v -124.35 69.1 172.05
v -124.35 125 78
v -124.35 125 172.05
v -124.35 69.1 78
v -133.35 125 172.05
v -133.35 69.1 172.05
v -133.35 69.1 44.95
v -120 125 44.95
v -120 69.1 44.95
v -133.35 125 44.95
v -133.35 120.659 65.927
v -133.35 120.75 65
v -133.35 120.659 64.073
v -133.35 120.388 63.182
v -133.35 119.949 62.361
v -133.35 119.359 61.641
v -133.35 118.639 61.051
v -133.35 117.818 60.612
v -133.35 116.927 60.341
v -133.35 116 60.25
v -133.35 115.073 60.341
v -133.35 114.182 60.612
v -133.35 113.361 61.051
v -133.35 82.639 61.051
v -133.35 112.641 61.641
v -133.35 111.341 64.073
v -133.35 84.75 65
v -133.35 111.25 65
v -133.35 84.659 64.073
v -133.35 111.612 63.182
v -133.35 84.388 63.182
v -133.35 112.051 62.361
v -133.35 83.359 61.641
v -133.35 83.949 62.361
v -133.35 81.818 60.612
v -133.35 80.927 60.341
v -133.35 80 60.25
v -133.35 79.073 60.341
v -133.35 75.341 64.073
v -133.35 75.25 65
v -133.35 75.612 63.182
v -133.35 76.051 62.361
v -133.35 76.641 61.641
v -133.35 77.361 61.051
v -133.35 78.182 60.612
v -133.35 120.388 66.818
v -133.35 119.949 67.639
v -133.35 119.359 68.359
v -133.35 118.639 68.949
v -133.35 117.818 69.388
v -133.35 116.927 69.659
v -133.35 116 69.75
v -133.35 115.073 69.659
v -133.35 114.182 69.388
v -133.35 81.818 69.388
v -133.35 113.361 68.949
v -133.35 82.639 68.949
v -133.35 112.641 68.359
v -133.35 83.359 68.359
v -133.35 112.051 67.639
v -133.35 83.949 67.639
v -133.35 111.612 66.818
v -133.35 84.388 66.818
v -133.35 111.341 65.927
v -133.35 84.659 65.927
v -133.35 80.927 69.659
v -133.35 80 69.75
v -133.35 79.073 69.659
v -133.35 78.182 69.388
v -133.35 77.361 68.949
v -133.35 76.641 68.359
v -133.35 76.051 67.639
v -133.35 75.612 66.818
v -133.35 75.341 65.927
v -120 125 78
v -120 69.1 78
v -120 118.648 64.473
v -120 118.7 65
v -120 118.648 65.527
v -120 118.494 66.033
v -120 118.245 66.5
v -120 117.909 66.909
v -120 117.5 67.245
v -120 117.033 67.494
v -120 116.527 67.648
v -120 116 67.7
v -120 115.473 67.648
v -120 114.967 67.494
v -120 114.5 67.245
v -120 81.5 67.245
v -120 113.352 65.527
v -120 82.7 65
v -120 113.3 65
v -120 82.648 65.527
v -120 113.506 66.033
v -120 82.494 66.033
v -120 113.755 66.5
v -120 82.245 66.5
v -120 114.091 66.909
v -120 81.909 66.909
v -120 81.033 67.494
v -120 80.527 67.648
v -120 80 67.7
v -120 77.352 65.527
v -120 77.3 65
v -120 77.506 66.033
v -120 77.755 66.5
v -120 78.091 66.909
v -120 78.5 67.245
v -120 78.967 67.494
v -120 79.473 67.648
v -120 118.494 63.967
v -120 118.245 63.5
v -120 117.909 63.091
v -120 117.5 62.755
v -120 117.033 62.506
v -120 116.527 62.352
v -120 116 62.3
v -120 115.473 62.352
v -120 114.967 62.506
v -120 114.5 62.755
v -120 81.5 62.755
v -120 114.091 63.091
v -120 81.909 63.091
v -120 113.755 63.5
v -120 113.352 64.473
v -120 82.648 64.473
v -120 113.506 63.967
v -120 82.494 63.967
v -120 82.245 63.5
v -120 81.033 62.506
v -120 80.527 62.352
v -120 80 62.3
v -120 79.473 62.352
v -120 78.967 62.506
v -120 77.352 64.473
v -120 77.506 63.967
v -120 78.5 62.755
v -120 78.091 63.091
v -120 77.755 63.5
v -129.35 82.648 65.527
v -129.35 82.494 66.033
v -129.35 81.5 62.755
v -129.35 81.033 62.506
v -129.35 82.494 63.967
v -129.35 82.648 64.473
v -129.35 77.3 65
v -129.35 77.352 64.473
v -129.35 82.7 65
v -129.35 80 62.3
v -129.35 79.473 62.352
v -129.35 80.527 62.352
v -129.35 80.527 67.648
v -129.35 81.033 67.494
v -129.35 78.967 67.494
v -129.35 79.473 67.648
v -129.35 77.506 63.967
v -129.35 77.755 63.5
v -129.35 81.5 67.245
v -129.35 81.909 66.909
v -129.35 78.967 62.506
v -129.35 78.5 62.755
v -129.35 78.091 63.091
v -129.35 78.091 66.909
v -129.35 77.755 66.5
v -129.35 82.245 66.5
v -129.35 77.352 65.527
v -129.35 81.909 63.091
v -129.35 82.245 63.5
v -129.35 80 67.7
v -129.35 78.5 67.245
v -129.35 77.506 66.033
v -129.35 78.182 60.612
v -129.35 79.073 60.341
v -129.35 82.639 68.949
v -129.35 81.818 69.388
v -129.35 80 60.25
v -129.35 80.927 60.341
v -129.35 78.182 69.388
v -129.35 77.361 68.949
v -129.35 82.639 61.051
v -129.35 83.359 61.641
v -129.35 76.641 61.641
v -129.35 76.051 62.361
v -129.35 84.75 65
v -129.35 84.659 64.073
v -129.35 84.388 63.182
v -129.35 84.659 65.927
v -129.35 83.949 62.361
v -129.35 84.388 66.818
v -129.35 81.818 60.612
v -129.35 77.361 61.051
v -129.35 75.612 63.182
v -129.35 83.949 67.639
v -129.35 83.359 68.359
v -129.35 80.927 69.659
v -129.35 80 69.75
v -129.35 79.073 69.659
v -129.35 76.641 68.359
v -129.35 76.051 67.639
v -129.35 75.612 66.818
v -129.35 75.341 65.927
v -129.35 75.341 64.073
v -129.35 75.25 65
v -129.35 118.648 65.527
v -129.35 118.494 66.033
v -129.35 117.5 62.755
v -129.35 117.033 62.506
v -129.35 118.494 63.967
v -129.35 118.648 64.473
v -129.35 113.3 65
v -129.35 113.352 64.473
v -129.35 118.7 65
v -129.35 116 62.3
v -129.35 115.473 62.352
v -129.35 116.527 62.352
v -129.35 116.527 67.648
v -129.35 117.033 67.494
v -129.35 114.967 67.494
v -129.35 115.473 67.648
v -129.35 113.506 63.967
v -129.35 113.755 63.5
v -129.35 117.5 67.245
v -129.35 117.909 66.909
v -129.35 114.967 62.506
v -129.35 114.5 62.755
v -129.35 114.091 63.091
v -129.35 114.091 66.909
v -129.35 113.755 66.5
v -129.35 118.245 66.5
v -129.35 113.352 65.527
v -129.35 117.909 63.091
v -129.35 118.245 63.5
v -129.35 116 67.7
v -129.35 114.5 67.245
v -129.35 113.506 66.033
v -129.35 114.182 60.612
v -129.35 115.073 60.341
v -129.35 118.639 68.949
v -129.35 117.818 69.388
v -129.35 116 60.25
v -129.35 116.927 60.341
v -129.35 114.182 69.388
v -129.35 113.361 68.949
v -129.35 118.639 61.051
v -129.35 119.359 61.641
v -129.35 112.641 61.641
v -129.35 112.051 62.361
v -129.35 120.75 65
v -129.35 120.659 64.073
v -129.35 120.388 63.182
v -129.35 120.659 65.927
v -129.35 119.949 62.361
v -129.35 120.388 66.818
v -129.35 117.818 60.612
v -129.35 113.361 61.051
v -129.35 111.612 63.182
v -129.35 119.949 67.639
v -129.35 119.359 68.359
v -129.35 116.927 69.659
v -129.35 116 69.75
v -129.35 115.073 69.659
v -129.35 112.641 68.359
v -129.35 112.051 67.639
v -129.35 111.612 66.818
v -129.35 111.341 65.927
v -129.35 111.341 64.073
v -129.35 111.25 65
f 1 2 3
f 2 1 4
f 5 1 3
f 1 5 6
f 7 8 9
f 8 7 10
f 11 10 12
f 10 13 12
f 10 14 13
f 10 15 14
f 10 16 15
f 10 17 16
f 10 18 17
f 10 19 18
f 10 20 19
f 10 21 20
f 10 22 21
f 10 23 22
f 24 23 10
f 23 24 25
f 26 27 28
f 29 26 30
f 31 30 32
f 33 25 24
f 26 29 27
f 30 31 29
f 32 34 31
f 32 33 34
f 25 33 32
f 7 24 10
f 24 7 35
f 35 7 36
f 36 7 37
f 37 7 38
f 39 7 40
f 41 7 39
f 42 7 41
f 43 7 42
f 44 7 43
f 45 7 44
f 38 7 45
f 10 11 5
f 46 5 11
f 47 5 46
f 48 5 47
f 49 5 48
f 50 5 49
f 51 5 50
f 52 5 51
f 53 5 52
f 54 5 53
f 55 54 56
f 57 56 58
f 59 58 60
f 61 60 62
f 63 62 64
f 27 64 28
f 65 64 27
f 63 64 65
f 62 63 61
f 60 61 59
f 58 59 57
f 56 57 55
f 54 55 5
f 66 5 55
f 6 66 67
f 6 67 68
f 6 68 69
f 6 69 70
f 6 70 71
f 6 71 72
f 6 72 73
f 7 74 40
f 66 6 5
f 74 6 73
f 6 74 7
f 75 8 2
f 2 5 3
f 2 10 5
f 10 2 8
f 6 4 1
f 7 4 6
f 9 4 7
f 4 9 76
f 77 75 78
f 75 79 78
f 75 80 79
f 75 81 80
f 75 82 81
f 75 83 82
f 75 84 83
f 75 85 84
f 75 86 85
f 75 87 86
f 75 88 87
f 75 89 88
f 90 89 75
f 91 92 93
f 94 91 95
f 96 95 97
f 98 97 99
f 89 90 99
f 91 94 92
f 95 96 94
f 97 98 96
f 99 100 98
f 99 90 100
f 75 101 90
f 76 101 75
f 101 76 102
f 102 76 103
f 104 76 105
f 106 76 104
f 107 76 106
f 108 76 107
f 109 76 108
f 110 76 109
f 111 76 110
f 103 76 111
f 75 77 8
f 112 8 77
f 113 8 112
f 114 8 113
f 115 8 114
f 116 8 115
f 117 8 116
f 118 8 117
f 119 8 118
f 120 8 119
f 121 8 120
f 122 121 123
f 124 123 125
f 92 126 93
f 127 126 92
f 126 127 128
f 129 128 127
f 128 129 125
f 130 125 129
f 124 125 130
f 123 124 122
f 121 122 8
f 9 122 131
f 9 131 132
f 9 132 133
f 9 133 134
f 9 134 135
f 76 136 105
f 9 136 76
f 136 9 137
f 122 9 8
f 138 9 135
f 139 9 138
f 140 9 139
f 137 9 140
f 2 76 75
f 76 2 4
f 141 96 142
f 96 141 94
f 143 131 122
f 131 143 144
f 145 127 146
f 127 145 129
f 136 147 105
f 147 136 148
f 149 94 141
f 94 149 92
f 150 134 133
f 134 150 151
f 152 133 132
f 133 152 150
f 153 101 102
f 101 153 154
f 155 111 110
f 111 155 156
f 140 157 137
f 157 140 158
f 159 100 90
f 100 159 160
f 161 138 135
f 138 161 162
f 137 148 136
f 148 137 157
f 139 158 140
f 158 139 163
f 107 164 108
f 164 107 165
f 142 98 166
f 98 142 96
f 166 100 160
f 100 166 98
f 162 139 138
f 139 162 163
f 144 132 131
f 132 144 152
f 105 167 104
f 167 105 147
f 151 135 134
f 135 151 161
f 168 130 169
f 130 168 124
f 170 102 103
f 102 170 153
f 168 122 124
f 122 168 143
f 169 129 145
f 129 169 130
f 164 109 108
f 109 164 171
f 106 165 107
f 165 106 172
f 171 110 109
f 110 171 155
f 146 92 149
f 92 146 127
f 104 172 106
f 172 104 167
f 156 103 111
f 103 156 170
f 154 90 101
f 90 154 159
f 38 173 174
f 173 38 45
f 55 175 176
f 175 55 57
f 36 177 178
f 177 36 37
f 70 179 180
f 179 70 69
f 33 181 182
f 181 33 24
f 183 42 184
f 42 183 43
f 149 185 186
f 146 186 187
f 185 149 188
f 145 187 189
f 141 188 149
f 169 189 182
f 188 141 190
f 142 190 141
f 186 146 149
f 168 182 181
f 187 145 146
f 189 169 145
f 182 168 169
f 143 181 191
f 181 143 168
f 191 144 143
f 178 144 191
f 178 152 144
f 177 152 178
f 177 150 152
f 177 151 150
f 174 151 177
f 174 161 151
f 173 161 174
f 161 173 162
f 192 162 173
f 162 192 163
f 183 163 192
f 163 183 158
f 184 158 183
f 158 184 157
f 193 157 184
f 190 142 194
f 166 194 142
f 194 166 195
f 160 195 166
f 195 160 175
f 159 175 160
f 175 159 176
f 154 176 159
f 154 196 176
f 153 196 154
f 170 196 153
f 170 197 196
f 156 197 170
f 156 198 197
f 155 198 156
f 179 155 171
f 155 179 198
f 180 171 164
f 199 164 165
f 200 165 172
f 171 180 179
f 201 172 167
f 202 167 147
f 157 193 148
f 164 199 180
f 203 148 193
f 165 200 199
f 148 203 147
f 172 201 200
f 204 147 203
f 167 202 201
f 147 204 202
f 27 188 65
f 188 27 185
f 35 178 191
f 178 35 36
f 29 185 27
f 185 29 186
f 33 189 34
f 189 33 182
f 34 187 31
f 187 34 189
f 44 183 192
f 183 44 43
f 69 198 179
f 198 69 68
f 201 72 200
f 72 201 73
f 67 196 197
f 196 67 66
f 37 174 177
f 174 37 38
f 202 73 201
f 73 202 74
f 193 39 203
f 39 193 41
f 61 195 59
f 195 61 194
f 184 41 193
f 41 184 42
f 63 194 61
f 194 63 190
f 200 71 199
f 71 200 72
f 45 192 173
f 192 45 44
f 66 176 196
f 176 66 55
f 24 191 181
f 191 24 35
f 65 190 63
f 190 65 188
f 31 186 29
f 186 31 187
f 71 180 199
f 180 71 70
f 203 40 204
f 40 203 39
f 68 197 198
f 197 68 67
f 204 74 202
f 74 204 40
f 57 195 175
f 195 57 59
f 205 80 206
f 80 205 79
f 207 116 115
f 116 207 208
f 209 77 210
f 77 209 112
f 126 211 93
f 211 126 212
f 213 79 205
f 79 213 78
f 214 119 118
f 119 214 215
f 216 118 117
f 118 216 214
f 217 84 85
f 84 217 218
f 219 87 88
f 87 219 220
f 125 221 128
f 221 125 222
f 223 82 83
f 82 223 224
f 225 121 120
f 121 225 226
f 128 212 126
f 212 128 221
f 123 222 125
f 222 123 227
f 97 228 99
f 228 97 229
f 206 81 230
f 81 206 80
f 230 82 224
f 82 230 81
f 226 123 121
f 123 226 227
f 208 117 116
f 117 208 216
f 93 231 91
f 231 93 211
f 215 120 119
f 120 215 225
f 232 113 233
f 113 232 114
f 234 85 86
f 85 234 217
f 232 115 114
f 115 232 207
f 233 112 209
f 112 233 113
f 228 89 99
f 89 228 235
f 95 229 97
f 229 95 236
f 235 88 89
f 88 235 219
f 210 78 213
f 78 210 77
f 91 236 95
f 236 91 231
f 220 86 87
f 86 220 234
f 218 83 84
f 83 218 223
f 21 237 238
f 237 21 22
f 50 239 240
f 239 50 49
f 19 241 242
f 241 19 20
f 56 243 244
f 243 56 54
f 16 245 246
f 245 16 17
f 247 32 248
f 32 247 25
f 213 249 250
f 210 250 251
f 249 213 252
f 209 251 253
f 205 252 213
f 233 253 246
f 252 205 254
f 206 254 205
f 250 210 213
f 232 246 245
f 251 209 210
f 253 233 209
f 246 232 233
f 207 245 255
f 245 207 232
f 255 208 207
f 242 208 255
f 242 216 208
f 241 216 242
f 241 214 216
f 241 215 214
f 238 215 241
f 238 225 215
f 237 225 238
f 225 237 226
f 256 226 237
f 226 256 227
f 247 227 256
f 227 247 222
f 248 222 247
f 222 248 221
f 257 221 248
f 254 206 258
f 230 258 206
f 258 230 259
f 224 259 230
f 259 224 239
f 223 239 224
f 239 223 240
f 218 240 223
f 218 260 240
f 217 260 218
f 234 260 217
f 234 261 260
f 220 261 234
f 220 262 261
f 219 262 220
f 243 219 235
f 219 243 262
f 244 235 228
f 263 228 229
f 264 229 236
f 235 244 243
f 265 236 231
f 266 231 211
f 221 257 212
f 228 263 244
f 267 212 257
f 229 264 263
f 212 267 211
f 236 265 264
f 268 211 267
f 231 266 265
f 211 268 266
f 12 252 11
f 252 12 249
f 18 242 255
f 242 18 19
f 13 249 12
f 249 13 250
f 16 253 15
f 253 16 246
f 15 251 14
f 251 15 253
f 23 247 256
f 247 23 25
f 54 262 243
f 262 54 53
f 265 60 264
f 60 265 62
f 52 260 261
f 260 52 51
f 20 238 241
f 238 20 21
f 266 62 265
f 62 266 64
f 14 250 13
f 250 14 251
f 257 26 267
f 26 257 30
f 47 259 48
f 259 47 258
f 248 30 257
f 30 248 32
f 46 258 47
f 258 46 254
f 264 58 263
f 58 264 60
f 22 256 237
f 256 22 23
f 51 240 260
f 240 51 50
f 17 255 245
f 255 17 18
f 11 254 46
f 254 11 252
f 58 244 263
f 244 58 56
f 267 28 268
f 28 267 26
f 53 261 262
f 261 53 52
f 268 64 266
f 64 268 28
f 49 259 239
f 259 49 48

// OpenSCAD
// =====================================================================
// child_side_bumper.scad — 子機 カメラ側面バンパ (左右共通 ×2)
//
//   子機外装_改善要件 (2026-09-04) §3.2、コーディネータ 2026-09-04 決定に基づく。
//   防水ケース側面 (x=±122.35) の外側に立つ t9 の板。`child_cam_bridge` の
//   ウイング端板フランジ (x=±wing_x1) へ M5×2 で締結する。輸送時はブリッジ
//   ごと外れる (C7「外せる部品」)。左右共通形状、機体では x=+/-133.35 側に
//   同一形状をミラー配置する (placement.json の mirror で対応、本体は左側
//   (sign=-1, x<0) を基準に作る)。
//
//   規約: cube/cylinder + boolean のみ。
// =====================================================================

/* [child_cam_mount / カメラ配置 (二重定義: child_cam_mount.scad, child_cam_bridge.scad)] */
lens_x       = 75;      // レンズ中心 |x|
lens_z       = 125;     // レンズ中心 z
cam_y_shift  = 14;
lens_y       = 106 + cam_y_shift;   // 120
cm_case_d    = 45.9;    // ケース奥行 (Y)
cm_case_w    = 94.7;    // ケース幅 (横向きでは機体 X 方向、cam_mount の case_w)
cm_case_h    = 84.1;    // ケース高さ (横向きでは機体 Z 方向)
// 2026-09-04 修正: 横向きでは「ケース幅」(case_w) が機体 X。旧式は case_h/2 を
// 使っており誤り (117.05 になっていた)。child_cam_bridge.scad と同じ式に統一。
case_outer_x = lens_x + cm_case_w / 2;  // 122.35 (ケース側面 |x|)

/* [child_cam_bridge 側 (二重定義: child_cam_bridge.scad)] */
deck_top     = lens_z - 42.05 - 30;   // 52.95 (cm_lens_off_bot=42.05, cm_fin_x1=30)
deck_bot     = deck_top - 8;          // 44.95
case_z0      = deck_top + 30;         // 82.95 (register 面 = ケース底)
case_z1      = case_z0 + cm_case_h;   // 167.05 (ケース上端)
case_y0      = lens_y - cm_case_d;    // 74.1
wing_x1      = 120;      // ウイング外端 (バンパ取付フランジの機体 x)
end_plate_t  = 6;
end_plate_z1 = 80;        // 2026-09-04 修正: 端板上端 (child_cam_bridge.scad front_web_z1/end_plate_z1 と同値)
bump_bolt_y  = [80, 116];   // child_cam_bridge.scad と同値 (二重定義)
bump_bolt_z  = 65;          // z<=78 (end_plate_z1-2) に収める — 両ファイルで同値

/* [バンパ本体] */
bumper_t   = 9;      // 板厚 (X 方向、立て壁部)
case_gap   = 2;       // ケース側面とのクリアランス
top_margin = 5;       // ケース上端 + 5 まで覆う
bot_margin = case_z0 - deck_bot; // バンパ下端はデッキ面まで (フランジ締結のため)
y_margin   = 5;        // ケース前後 +5 ずつ

/* [L 形フット (2026-09-04 追加): ブリッジ端板の外面 (x=wing_x1) まで内側へ
   延長し密着させる。check_asm_contacts で FLOATING (4.35mm 浮き) が検出された
   ため追加した。ケース底面 (case_z0=82.95) より下の帯のみ (ケースと干渉しない)。] */
foot_z1 = 78;   // フット上端。end_plate_z1(80) の 2mm 手前、ケース底面よりずっと下

/* [締結: M5×2、ブリッジ端板フランジへ。バンパ側は通し穴+皿ざぐり、
   ブリッジ側 (child_cam_bridge.scad) がナットトラップを持つ] */
m5_clear = 5.4;
head_d   = 9.5;   // M5 皿/丸頭の逃げ (工具アクセス)
head_dep = 4.0;

/* [機体レベル検査] */
env_half = 140;   // 280/2

/* [Hidden] */
fudge = 0.01;
$fn = 48;

// ---- 導出値 -----------------------------------------------------------
inner_x = case_outer_x + case_gap;      // 124.35 (バンパ内面)
outer_x = inner_x + bumper_t;           // 133.35 (バンパ外面)
z0      = deck_bot;                      // 44.95 (下端、フランジで締結)
z1      = case_z1 + top_margin;         // 172.05 (上端)
y0      = case_y0 - y_margin;           // 69.1
y1      = lens_y + y_margin;            // 125

// ---- 干渉・成立性チェック -----------------------------------------------
assert(inner_x - case_outer_x >= case_gap - 1e-6, "ケース側面とのクリアランス不足");
assert(outer_x <= env_half, "バンパ外面が 280 枠 (半幅140) を超える");
assert(z0 <= deck_bot + 1e-6, "バンパ下端がブリッジデッキ面より高い (締結フランジに届かない)");
assert(z1 >= case_z1 + top_margin - 1e-6, "バンパ上端がケース上端+5 未満");
for (by = bump_bolt_y) {
    assert(by >= y0 + 3 && by <= y1 - 3,
           "バンパ締結穴がバンパ端から 3mm 未満");
}
assert(bump_bolt_z >= z0 + 5 && bump_bolt_z <= end_plate_z1 - 2,
       "バンパ締結穴がブリッジ端板フランジの高さ範囲 (z<=end_plate_z1-2=78) の外");
// フットがブリッジ端板の外面 (x=wing_x1) まで密着して届くこと (旧: inner_x=124.35
// までしかなく wing_x1=120 との間に 4.35mm の隙間があり FLOATING だった)
assert(inner_x > wing_x1, "フットが端板の外面 (wing_x1) まで届かない");
// フットはケース底面 (case_z0) より 1mm 以上下 (ケースと干渉しない。x 方向は
// フット (~120..133.35) とケース (~27.65..122.35) が 120..122.35 で重なるが、
// z 方向を分離することで回避する)
assert(foot_z1 <= case_z0 - 1, "フットがケース底面に 1mm 未満で接近/食い込む");
assert(foot_z1 > z0, "フット高さが 0 以下");

echo(str("バンパ x = ", inner_x, " .. ", outer_x, " (外面 ", outer_x, " <= ", env_half, ")"));
echo(str("バンパ y = ", y0, " .. ", y1, "  z = ", z0, " .. ", z1));
echo(str("フット x = ", wing_x1, " .. ", outer_x, " (端板外面 wing_x1=", wing_x1,
         " に密着) z = ", z0, " .. ", foot_z1));

// ---- 形状 (左側基準: x < 0 側。機体では child_cam_bridge の左ウイングに
//      沿わせる。右側は placement.json で mirror = [1,0,0] を掛ける) ----
module bumper_solid() {
    // メインの立て壁 (ケース側面ガード、全高)
    translate([-outer_x, y0, z0])
        cube([outer_x - inner_x, y1 - y0, z1 - z0]);
    // L 形フット (ケース底面より下の帯のみ。ブリッジ端板の外面 x=wing_x1 まで
    // 内側へ延長して密着させる — 2026-09-04 追加、FLOATING 修正)
    translate([-outer_x, y0, z0])
        cube([outer_x - wing_x1, y1 - y0, foot_z1 - z0]);
}

module bumper_holes() {
    // 通し穴 + 頭の逃げは、フット追加後は外面から端板外面 (wing_x1) まで
    // 全長を貫通させる (旧: 立て壁の厚み分 (9mm) しか貫通していなかった)
    full_h = outer_x - wing_x1;   // 13.35 (外面から端板外面まで)
    for (by = bump_bolt_y) {
        // 通し穴 (軸 X)
        translate([-outer_x - fudge, by, bump_bolt_z])
            rotate([0, 90, 0])
                cylinder(d = m5_clear, h = full_h + 2 * fudge, $fn = 32);
        // 頭の逃げ (外面側)
        translate([-outer_x - fudge, by, bump_bolt_z])
            rotate([0, 90, 0])
                cylinder(d = head_d, h = head_dep + fudge, $fn = 32);
    }
}

difference() {
    bumper_solid();
    bumper_holes();
}
